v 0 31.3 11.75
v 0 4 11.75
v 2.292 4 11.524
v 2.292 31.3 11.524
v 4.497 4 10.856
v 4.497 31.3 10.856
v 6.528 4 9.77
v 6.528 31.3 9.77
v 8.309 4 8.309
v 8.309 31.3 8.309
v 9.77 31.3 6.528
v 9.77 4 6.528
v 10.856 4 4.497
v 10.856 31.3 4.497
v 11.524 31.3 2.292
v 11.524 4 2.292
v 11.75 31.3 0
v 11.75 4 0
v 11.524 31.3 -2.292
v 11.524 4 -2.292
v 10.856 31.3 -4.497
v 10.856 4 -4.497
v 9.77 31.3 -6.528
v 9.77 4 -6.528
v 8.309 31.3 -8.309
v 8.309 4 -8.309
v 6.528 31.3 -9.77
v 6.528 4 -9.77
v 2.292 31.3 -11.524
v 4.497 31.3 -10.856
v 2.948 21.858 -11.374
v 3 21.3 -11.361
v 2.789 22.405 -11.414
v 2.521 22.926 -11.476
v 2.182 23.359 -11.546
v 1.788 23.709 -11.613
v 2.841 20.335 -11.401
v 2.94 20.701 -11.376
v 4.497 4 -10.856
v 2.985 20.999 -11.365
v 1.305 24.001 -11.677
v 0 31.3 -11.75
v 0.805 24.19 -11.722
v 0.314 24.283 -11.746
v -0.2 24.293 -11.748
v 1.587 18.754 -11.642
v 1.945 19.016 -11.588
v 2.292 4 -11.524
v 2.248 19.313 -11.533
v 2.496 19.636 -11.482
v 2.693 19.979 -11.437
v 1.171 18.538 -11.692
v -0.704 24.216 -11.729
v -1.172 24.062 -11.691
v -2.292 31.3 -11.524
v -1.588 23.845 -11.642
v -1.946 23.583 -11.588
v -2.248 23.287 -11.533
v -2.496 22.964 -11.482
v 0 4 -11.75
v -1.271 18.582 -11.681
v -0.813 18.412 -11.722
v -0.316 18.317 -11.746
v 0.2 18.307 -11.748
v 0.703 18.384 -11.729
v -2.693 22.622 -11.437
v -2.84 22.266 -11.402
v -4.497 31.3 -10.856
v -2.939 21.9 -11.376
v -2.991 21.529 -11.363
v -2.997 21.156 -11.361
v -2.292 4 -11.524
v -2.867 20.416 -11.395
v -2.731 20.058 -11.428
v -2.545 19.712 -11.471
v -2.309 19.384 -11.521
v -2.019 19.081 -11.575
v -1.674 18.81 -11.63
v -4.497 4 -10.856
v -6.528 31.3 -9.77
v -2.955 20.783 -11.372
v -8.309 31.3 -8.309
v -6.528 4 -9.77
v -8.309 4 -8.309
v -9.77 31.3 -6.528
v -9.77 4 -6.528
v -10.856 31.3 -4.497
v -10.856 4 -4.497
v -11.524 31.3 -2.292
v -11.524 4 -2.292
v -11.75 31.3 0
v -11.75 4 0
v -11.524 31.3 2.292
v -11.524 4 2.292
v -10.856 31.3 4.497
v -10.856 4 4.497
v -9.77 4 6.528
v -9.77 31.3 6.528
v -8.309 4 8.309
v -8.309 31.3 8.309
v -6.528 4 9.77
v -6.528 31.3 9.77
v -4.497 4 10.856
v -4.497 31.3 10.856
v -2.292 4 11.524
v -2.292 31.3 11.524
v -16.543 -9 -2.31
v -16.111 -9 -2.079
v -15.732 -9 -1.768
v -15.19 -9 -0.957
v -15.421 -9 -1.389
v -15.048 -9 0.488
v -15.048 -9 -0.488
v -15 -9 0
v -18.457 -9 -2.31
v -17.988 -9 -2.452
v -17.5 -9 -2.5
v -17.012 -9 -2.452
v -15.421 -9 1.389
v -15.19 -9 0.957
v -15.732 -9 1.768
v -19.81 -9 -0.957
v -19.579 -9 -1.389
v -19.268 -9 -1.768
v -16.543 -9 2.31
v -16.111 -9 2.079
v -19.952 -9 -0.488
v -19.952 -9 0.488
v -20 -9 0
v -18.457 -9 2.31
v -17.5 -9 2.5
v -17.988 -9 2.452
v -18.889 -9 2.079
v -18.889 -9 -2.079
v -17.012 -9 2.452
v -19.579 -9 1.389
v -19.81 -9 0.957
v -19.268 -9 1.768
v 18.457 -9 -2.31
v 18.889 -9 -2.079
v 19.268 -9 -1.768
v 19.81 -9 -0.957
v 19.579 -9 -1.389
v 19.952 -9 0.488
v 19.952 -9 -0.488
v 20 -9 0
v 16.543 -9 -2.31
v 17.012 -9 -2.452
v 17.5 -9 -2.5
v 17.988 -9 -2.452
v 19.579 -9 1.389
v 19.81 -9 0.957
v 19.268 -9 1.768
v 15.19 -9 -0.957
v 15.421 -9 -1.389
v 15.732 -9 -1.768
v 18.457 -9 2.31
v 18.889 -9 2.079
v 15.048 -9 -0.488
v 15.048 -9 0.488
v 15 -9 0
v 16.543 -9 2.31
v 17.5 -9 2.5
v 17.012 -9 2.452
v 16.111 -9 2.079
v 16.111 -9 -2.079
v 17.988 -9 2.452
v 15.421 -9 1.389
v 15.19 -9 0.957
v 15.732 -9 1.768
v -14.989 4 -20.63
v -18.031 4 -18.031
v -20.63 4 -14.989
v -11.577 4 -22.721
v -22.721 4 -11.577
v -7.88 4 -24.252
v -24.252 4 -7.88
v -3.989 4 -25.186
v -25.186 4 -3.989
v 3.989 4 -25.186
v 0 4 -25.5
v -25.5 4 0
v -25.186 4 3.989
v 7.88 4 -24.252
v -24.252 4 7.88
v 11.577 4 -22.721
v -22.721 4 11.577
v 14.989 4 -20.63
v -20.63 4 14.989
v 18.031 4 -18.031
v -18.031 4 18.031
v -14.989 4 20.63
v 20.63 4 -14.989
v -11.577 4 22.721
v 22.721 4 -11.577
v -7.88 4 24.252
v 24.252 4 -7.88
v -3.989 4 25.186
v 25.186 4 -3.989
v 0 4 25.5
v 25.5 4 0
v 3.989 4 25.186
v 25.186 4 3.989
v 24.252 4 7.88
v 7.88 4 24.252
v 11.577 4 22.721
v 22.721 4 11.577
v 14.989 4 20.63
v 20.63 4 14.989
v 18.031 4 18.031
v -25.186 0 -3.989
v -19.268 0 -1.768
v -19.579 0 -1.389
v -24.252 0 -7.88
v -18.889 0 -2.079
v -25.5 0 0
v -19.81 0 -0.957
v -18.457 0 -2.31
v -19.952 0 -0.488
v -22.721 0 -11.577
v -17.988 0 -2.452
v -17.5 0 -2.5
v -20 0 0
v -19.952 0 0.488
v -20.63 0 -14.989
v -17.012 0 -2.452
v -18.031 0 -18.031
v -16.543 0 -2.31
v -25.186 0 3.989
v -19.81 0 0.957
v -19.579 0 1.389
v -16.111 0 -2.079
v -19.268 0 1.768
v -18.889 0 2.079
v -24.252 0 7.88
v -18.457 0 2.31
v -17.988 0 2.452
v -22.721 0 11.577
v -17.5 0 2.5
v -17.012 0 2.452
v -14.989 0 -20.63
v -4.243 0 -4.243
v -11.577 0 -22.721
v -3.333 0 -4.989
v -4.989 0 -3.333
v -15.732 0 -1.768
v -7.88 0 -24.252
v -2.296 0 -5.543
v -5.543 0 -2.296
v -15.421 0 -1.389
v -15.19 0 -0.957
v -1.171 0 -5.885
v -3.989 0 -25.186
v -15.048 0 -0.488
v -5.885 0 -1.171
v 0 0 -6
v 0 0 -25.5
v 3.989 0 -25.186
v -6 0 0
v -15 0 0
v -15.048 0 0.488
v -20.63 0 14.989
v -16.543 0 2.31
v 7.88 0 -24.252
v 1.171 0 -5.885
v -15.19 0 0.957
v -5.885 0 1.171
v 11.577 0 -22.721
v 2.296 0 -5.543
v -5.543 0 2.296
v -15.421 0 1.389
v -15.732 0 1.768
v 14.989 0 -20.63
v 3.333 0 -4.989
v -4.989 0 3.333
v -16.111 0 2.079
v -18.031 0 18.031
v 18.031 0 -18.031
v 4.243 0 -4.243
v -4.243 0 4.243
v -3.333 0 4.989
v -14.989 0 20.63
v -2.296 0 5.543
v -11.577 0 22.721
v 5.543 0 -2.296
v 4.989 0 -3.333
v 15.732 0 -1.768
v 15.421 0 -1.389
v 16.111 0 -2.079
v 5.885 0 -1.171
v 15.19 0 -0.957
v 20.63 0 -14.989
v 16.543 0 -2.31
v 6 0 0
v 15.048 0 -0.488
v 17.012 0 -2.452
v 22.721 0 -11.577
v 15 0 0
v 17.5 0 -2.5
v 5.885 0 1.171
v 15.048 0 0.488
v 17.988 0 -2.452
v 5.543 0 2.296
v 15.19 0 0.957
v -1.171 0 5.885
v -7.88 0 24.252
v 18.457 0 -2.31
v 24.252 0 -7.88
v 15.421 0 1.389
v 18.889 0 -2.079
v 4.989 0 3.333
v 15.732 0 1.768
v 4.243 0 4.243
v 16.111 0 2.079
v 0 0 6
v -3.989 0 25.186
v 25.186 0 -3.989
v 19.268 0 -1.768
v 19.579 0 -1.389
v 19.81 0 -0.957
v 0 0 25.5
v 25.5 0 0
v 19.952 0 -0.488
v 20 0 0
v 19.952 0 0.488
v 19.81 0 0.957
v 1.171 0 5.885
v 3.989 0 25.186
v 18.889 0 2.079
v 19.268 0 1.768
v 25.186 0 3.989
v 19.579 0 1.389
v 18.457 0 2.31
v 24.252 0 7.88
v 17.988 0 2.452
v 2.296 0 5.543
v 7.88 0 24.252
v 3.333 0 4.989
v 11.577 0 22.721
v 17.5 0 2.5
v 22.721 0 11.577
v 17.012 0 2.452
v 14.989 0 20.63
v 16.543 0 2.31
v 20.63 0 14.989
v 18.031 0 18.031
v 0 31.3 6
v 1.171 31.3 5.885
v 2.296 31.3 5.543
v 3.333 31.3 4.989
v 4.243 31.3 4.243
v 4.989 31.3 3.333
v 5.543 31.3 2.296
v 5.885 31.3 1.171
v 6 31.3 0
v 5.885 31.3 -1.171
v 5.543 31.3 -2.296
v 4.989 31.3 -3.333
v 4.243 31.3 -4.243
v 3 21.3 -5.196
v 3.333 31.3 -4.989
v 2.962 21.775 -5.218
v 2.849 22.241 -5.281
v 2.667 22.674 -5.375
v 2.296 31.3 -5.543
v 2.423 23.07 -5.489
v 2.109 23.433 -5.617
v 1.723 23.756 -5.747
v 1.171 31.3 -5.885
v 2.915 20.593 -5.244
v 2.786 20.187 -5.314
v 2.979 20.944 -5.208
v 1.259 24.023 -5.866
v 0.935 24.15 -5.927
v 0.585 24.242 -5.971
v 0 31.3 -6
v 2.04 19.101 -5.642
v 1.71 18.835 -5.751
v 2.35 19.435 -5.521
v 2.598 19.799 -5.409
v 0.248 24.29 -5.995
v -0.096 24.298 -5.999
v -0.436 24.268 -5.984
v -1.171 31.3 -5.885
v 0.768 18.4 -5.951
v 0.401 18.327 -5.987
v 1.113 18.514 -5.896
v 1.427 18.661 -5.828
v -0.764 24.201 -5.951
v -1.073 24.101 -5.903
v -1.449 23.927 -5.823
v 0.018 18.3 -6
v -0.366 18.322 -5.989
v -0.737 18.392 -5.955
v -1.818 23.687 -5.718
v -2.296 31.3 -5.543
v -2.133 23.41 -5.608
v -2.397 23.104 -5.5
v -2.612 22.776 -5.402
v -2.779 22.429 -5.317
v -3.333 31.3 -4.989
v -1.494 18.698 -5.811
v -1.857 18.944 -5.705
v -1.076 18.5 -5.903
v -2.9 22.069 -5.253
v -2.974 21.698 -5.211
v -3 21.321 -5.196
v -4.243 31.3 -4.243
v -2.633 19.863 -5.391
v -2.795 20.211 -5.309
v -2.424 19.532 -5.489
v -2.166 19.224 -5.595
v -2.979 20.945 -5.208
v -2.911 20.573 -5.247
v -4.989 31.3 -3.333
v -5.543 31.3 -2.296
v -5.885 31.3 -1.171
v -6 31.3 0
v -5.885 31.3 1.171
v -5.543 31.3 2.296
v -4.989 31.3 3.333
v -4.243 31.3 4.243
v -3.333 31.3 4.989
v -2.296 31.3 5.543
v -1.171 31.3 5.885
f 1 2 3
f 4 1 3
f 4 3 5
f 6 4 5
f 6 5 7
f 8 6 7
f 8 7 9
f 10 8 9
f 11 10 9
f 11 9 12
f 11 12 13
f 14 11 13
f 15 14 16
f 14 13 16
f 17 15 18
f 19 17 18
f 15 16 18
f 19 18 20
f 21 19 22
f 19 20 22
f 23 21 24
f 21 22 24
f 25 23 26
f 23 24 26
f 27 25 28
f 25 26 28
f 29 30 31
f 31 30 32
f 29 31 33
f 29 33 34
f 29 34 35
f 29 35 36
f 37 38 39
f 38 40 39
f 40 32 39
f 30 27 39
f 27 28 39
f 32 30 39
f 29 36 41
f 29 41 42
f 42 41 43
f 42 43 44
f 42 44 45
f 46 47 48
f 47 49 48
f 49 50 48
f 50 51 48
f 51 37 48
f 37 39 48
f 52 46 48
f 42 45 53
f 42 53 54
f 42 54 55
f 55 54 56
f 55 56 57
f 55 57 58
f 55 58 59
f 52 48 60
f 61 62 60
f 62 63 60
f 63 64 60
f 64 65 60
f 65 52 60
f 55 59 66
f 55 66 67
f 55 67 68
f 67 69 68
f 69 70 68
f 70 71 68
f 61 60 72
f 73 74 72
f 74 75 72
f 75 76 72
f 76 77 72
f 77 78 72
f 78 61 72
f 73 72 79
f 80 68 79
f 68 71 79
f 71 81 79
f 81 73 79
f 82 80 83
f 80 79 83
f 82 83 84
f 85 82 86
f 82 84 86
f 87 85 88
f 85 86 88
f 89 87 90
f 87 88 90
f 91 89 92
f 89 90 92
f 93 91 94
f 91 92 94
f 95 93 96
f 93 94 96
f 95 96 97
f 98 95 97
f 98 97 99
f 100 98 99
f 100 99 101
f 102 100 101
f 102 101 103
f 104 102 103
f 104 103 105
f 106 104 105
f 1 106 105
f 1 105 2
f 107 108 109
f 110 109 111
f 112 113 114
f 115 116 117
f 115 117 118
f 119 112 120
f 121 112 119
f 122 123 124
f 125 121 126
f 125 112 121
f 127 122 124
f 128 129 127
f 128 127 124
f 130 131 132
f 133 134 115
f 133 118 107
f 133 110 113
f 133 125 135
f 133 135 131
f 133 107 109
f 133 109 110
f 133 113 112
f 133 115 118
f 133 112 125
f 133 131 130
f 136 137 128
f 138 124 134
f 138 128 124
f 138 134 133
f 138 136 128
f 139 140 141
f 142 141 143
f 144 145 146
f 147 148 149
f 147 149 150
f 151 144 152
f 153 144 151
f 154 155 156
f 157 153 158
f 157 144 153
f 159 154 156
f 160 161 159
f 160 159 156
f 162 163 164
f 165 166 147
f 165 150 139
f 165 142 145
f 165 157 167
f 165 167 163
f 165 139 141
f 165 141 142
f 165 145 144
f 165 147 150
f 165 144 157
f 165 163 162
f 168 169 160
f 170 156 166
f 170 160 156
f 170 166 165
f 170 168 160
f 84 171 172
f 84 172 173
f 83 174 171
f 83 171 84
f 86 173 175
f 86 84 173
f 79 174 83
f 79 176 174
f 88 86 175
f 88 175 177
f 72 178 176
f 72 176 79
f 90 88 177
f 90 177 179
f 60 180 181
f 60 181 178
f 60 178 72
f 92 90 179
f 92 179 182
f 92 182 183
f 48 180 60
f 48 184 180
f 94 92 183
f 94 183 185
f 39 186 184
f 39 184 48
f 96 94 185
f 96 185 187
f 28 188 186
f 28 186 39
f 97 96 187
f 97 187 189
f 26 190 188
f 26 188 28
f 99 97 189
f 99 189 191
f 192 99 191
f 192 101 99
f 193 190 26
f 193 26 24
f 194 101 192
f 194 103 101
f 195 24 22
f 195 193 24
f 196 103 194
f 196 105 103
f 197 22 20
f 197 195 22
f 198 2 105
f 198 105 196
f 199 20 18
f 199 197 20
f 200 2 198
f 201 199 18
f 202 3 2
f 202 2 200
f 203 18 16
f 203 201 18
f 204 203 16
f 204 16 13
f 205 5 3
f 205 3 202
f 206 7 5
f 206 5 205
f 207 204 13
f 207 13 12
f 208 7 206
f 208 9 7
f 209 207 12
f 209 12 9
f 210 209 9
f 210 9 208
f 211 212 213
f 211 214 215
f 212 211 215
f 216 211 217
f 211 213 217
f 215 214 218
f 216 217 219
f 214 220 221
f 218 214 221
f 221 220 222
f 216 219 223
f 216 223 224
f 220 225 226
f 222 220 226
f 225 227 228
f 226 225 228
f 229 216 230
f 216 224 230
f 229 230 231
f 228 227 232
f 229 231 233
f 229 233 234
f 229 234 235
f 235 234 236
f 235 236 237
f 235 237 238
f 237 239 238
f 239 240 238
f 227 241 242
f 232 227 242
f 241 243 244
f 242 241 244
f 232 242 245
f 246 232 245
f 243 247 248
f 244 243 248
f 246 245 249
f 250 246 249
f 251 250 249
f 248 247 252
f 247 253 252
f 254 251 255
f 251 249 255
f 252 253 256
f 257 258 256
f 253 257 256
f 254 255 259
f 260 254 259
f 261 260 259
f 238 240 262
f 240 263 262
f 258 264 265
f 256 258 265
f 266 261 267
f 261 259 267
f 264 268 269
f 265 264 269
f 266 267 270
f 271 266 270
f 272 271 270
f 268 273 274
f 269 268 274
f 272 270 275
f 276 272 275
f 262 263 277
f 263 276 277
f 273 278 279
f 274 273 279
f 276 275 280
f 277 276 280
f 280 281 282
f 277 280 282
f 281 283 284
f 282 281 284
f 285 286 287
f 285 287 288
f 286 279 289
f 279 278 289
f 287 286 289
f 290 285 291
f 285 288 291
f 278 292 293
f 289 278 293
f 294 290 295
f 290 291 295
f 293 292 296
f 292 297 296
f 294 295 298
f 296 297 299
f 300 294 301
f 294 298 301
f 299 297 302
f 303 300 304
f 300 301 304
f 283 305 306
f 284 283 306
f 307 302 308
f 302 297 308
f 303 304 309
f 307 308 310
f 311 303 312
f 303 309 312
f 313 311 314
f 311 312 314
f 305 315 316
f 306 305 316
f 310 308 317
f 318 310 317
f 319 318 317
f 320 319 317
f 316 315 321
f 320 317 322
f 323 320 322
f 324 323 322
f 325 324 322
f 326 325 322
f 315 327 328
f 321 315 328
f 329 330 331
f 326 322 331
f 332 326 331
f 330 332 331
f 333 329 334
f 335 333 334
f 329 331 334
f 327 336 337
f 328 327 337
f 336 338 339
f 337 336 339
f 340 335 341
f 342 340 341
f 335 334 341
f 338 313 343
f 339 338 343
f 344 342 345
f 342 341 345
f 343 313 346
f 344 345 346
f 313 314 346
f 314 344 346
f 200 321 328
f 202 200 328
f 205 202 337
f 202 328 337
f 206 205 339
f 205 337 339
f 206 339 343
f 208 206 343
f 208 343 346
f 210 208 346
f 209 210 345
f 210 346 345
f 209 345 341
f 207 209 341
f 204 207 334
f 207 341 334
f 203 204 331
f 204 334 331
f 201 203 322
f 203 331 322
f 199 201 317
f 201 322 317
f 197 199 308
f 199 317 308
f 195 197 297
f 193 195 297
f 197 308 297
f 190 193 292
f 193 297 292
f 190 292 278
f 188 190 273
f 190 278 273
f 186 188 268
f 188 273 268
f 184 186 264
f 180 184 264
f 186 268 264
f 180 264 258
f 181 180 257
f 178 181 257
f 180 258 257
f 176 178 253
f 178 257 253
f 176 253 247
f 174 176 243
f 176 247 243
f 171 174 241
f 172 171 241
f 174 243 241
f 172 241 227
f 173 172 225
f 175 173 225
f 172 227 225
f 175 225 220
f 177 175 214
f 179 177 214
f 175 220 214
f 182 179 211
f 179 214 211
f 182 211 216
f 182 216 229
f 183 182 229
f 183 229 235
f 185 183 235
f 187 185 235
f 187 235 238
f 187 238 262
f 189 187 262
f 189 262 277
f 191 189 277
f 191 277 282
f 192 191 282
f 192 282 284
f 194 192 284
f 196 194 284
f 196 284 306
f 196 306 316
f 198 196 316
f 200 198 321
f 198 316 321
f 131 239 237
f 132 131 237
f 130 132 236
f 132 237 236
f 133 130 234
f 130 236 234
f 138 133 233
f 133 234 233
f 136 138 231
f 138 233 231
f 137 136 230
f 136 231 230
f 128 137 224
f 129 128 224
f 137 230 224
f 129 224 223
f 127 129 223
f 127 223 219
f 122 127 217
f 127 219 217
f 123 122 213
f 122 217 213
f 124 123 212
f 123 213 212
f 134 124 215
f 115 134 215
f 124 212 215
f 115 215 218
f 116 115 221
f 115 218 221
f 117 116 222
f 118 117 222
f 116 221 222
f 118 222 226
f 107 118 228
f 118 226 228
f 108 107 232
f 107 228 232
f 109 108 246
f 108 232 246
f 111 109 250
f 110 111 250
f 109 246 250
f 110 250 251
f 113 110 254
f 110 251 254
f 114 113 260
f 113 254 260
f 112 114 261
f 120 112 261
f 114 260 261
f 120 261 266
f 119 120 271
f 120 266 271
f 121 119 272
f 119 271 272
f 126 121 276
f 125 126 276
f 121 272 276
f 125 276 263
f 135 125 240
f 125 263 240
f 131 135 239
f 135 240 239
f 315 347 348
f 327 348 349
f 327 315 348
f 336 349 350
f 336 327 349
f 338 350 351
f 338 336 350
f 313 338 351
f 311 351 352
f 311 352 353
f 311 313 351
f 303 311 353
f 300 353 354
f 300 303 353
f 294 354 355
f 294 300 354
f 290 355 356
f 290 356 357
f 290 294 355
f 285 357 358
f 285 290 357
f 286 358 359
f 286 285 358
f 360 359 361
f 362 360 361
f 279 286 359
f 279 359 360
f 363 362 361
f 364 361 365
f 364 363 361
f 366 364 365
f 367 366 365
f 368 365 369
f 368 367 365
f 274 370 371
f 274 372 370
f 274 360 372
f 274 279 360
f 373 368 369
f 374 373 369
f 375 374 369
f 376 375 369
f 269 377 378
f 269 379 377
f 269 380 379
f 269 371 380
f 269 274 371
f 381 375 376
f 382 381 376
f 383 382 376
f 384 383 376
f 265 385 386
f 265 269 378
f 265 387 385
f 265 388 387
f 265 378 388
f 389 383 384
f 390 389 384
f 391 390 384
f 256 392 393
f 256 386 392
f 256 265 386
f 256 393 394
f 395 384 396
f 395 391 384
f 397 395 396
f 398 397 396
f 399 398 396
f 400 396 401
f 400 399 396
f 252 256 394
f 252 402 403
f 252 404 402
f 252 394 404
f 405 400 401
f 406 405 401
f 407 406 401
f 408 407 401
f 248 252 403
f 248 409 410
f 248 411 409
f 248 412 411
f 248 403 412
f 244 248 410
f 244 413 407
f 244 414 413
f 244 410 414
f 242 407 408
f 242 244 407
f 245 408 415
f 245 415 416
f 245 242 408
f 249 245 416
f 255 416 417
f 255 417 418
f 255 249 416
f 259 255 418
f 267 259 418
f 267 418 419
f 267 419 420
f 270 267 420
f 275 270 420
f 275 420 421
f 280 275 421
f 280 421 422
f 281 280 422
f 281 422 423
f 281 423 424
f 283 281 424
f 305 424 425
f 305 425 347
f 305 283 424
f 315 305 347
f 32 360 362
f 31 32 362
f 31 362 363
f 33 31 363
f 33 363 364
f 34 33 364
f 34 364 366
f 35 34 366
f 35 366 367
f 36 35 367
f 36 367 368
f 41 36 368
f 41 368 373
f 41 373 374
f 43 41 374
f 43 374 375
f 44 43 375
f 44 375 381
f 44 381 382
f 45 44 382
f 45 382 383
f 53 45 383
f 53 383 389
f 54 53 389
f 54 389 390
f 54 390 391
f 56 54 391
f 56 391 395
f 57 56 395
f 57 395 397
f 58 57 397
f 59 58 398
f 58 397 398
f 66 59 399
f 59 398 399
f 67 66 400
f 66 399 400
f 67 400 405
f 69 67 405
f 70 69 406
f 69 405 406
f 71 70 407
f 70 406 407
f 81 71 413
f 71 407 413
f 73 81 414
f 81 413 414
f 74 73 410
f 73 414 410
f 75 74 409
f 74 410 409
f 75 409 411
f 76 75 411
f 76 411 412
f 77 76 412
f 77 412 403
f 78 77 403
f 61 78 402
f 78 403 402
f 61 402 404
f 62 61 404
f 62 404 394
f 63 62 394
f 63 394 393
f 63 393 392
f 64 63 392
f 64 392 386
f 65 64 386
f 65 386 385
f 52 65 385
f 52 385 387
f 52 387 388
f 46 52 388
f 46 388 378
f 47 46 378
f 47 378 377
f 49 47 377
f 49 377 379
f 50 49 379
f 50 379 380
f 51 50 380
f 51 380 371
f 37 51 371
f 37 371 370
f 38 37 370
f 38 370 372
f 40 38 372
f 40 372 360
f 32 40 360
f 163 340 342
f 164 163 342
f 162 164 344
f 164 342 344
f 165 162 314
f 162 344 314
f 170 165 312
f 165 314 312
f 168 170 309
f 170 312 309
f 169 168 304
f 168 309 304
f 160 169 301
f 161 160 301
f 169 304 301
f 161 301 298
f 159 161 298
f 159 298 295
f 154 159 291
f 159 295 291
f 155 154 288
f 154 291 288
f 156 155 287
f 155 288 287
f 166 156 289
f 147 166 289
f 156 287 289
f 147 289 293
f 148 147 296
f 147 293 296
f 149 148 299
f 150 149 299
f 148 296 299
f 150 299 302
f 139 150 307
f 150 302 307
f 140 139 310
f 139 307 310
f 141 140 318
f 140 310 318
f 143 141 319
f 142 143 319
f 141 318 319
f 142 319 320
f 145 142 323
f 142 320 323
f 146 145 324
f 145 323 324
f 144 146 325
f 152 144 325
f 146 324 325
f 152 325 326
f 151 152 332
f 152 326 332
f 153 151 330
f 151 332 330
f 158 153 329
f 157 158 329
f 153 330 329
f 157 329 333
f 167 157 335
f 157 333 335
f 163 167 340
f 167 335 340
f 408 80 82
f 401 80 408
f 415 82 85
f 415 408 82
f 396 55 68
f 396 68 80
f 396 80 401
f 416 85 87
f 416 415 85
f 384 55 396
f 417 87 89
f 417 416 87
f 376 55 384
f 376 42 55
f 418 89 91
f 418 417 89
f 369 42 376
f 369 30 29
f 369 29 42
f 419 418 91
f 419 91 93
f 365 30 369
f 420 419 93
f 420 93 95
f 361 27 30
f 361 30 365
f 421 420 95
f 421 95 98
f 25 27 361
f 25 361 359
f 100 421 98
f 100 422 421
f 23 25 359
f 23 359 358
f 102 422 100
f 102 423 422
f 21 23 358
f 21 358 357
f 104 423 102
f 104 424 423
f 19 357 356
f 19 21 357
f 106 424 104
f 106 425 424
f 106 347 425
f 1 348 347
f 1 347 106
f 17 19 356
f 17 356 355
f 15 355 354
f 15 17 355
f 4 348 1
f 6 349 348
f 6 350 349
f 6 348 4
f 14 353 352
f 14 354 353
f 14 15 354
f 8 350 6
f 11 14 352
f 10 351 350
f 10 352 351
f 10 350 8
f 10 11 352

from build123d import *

# Parameters (mm, degrees)
SKETCH_1_R               = 25.5
SKETCH_1_R_2             = 6
EXTRUDE_1_DEPTH          = 4
SKETCH_2_R               = 11.75
SKETCH_2_R_2             = 6
EXTRUDE_2_DEPTH          = 27.3
SKETCH_3_R               = 2.5
EXTRUDE_3_DEPTH          = 9
CUT_EXTRUDE_1_REACH      = 49.751
CUT_EXTRUDE_1_END_RADIUS = 11.75
SKETCH_5_R               = 3


with BuildPart() as part:
    # Эскиз1 → Бобышка-Вытянуть1 (new body)
    with BuildSketch(Plane(origin=(0, 0, 0), x_dir=(1, 0, 0), z_dir=(0, 1, 0))):
        with Locations(Location((0, 0, 0), (0, 0, 270))):
            Circle(SKETCH_1_R)
        with Locations(Location((0, 0, 0), (0, 0, 270))):
            Circle(SKETCH_1_R_2, mode=Mode.SUBTRACT)
    extrude(amount=EXTRUDE_1_DEPTH)

    # Эскиз2 → Бобышка-Вытянуть2 (add)
    with BuildSketch(Plane(origin=(0, 4, 0), x_dir=(1, 0, 0), z_dir=(0, 1, 0))):
        with Locations(Location((0, 0, 0), (0, 0, 270))):
            Circle(SKETCH_2_R)
        with Locations(Location((0, 0, 0), (0, 0, 270))):
            Circle(SKETCH_2_R_2, mode=Mode.SUBTRACT)
    extrude(amount=EXTRUDE_2_DEPTH)

    # Эскиз3 → Бобышка-Вытянуть3 (add)
    with BuildSketch(Plane.XZ):
        with Locations(Location((-17.5, 0, 0), (0, 0, 90))):
            Circle(SKETCH_3_R)
        with Locations(Location((17.5, 0, 0), (0, 0, 90))):
            Circle(SKETCH_3_R)
    extrude(amount=EXTRUDE_3_DEPTH)

    # Вырез-Вытянуть1: up to this cylinder (the profile starts inside it)
    cut_extrude_1_end = Plane(origin=(0, 21.3, 0), z_dir=(0, -1, 0)) * Cylinder(CUT_EXTRUDE_1_END_RADIUS, 124.002, mode=Mode.PRIVATE)
    # Эскиз5 → Вырез-Вытянуть1 (cut, up to the surface)
    with BuildSketch(Plane.XY, mode=Mode.PRIVATE) as cut_extrude_1_sk1:
        with Locations((0, 21.3)):
            Circle(SKETCH_5_R)
    cut_extrude_1_tool1 = extrude(cut_extrude_1_sk1.sketch, amount=-CUT_EXTRUDE_1_REACH, mode=Mode.PRIVATE) & cut_extrude_1_end
    add(cut_extrude_1_tool1.solids().sort_by_distance((0, 21.3, 0))[0], mode=Mode.SUBTRACT)


solid = part.part
